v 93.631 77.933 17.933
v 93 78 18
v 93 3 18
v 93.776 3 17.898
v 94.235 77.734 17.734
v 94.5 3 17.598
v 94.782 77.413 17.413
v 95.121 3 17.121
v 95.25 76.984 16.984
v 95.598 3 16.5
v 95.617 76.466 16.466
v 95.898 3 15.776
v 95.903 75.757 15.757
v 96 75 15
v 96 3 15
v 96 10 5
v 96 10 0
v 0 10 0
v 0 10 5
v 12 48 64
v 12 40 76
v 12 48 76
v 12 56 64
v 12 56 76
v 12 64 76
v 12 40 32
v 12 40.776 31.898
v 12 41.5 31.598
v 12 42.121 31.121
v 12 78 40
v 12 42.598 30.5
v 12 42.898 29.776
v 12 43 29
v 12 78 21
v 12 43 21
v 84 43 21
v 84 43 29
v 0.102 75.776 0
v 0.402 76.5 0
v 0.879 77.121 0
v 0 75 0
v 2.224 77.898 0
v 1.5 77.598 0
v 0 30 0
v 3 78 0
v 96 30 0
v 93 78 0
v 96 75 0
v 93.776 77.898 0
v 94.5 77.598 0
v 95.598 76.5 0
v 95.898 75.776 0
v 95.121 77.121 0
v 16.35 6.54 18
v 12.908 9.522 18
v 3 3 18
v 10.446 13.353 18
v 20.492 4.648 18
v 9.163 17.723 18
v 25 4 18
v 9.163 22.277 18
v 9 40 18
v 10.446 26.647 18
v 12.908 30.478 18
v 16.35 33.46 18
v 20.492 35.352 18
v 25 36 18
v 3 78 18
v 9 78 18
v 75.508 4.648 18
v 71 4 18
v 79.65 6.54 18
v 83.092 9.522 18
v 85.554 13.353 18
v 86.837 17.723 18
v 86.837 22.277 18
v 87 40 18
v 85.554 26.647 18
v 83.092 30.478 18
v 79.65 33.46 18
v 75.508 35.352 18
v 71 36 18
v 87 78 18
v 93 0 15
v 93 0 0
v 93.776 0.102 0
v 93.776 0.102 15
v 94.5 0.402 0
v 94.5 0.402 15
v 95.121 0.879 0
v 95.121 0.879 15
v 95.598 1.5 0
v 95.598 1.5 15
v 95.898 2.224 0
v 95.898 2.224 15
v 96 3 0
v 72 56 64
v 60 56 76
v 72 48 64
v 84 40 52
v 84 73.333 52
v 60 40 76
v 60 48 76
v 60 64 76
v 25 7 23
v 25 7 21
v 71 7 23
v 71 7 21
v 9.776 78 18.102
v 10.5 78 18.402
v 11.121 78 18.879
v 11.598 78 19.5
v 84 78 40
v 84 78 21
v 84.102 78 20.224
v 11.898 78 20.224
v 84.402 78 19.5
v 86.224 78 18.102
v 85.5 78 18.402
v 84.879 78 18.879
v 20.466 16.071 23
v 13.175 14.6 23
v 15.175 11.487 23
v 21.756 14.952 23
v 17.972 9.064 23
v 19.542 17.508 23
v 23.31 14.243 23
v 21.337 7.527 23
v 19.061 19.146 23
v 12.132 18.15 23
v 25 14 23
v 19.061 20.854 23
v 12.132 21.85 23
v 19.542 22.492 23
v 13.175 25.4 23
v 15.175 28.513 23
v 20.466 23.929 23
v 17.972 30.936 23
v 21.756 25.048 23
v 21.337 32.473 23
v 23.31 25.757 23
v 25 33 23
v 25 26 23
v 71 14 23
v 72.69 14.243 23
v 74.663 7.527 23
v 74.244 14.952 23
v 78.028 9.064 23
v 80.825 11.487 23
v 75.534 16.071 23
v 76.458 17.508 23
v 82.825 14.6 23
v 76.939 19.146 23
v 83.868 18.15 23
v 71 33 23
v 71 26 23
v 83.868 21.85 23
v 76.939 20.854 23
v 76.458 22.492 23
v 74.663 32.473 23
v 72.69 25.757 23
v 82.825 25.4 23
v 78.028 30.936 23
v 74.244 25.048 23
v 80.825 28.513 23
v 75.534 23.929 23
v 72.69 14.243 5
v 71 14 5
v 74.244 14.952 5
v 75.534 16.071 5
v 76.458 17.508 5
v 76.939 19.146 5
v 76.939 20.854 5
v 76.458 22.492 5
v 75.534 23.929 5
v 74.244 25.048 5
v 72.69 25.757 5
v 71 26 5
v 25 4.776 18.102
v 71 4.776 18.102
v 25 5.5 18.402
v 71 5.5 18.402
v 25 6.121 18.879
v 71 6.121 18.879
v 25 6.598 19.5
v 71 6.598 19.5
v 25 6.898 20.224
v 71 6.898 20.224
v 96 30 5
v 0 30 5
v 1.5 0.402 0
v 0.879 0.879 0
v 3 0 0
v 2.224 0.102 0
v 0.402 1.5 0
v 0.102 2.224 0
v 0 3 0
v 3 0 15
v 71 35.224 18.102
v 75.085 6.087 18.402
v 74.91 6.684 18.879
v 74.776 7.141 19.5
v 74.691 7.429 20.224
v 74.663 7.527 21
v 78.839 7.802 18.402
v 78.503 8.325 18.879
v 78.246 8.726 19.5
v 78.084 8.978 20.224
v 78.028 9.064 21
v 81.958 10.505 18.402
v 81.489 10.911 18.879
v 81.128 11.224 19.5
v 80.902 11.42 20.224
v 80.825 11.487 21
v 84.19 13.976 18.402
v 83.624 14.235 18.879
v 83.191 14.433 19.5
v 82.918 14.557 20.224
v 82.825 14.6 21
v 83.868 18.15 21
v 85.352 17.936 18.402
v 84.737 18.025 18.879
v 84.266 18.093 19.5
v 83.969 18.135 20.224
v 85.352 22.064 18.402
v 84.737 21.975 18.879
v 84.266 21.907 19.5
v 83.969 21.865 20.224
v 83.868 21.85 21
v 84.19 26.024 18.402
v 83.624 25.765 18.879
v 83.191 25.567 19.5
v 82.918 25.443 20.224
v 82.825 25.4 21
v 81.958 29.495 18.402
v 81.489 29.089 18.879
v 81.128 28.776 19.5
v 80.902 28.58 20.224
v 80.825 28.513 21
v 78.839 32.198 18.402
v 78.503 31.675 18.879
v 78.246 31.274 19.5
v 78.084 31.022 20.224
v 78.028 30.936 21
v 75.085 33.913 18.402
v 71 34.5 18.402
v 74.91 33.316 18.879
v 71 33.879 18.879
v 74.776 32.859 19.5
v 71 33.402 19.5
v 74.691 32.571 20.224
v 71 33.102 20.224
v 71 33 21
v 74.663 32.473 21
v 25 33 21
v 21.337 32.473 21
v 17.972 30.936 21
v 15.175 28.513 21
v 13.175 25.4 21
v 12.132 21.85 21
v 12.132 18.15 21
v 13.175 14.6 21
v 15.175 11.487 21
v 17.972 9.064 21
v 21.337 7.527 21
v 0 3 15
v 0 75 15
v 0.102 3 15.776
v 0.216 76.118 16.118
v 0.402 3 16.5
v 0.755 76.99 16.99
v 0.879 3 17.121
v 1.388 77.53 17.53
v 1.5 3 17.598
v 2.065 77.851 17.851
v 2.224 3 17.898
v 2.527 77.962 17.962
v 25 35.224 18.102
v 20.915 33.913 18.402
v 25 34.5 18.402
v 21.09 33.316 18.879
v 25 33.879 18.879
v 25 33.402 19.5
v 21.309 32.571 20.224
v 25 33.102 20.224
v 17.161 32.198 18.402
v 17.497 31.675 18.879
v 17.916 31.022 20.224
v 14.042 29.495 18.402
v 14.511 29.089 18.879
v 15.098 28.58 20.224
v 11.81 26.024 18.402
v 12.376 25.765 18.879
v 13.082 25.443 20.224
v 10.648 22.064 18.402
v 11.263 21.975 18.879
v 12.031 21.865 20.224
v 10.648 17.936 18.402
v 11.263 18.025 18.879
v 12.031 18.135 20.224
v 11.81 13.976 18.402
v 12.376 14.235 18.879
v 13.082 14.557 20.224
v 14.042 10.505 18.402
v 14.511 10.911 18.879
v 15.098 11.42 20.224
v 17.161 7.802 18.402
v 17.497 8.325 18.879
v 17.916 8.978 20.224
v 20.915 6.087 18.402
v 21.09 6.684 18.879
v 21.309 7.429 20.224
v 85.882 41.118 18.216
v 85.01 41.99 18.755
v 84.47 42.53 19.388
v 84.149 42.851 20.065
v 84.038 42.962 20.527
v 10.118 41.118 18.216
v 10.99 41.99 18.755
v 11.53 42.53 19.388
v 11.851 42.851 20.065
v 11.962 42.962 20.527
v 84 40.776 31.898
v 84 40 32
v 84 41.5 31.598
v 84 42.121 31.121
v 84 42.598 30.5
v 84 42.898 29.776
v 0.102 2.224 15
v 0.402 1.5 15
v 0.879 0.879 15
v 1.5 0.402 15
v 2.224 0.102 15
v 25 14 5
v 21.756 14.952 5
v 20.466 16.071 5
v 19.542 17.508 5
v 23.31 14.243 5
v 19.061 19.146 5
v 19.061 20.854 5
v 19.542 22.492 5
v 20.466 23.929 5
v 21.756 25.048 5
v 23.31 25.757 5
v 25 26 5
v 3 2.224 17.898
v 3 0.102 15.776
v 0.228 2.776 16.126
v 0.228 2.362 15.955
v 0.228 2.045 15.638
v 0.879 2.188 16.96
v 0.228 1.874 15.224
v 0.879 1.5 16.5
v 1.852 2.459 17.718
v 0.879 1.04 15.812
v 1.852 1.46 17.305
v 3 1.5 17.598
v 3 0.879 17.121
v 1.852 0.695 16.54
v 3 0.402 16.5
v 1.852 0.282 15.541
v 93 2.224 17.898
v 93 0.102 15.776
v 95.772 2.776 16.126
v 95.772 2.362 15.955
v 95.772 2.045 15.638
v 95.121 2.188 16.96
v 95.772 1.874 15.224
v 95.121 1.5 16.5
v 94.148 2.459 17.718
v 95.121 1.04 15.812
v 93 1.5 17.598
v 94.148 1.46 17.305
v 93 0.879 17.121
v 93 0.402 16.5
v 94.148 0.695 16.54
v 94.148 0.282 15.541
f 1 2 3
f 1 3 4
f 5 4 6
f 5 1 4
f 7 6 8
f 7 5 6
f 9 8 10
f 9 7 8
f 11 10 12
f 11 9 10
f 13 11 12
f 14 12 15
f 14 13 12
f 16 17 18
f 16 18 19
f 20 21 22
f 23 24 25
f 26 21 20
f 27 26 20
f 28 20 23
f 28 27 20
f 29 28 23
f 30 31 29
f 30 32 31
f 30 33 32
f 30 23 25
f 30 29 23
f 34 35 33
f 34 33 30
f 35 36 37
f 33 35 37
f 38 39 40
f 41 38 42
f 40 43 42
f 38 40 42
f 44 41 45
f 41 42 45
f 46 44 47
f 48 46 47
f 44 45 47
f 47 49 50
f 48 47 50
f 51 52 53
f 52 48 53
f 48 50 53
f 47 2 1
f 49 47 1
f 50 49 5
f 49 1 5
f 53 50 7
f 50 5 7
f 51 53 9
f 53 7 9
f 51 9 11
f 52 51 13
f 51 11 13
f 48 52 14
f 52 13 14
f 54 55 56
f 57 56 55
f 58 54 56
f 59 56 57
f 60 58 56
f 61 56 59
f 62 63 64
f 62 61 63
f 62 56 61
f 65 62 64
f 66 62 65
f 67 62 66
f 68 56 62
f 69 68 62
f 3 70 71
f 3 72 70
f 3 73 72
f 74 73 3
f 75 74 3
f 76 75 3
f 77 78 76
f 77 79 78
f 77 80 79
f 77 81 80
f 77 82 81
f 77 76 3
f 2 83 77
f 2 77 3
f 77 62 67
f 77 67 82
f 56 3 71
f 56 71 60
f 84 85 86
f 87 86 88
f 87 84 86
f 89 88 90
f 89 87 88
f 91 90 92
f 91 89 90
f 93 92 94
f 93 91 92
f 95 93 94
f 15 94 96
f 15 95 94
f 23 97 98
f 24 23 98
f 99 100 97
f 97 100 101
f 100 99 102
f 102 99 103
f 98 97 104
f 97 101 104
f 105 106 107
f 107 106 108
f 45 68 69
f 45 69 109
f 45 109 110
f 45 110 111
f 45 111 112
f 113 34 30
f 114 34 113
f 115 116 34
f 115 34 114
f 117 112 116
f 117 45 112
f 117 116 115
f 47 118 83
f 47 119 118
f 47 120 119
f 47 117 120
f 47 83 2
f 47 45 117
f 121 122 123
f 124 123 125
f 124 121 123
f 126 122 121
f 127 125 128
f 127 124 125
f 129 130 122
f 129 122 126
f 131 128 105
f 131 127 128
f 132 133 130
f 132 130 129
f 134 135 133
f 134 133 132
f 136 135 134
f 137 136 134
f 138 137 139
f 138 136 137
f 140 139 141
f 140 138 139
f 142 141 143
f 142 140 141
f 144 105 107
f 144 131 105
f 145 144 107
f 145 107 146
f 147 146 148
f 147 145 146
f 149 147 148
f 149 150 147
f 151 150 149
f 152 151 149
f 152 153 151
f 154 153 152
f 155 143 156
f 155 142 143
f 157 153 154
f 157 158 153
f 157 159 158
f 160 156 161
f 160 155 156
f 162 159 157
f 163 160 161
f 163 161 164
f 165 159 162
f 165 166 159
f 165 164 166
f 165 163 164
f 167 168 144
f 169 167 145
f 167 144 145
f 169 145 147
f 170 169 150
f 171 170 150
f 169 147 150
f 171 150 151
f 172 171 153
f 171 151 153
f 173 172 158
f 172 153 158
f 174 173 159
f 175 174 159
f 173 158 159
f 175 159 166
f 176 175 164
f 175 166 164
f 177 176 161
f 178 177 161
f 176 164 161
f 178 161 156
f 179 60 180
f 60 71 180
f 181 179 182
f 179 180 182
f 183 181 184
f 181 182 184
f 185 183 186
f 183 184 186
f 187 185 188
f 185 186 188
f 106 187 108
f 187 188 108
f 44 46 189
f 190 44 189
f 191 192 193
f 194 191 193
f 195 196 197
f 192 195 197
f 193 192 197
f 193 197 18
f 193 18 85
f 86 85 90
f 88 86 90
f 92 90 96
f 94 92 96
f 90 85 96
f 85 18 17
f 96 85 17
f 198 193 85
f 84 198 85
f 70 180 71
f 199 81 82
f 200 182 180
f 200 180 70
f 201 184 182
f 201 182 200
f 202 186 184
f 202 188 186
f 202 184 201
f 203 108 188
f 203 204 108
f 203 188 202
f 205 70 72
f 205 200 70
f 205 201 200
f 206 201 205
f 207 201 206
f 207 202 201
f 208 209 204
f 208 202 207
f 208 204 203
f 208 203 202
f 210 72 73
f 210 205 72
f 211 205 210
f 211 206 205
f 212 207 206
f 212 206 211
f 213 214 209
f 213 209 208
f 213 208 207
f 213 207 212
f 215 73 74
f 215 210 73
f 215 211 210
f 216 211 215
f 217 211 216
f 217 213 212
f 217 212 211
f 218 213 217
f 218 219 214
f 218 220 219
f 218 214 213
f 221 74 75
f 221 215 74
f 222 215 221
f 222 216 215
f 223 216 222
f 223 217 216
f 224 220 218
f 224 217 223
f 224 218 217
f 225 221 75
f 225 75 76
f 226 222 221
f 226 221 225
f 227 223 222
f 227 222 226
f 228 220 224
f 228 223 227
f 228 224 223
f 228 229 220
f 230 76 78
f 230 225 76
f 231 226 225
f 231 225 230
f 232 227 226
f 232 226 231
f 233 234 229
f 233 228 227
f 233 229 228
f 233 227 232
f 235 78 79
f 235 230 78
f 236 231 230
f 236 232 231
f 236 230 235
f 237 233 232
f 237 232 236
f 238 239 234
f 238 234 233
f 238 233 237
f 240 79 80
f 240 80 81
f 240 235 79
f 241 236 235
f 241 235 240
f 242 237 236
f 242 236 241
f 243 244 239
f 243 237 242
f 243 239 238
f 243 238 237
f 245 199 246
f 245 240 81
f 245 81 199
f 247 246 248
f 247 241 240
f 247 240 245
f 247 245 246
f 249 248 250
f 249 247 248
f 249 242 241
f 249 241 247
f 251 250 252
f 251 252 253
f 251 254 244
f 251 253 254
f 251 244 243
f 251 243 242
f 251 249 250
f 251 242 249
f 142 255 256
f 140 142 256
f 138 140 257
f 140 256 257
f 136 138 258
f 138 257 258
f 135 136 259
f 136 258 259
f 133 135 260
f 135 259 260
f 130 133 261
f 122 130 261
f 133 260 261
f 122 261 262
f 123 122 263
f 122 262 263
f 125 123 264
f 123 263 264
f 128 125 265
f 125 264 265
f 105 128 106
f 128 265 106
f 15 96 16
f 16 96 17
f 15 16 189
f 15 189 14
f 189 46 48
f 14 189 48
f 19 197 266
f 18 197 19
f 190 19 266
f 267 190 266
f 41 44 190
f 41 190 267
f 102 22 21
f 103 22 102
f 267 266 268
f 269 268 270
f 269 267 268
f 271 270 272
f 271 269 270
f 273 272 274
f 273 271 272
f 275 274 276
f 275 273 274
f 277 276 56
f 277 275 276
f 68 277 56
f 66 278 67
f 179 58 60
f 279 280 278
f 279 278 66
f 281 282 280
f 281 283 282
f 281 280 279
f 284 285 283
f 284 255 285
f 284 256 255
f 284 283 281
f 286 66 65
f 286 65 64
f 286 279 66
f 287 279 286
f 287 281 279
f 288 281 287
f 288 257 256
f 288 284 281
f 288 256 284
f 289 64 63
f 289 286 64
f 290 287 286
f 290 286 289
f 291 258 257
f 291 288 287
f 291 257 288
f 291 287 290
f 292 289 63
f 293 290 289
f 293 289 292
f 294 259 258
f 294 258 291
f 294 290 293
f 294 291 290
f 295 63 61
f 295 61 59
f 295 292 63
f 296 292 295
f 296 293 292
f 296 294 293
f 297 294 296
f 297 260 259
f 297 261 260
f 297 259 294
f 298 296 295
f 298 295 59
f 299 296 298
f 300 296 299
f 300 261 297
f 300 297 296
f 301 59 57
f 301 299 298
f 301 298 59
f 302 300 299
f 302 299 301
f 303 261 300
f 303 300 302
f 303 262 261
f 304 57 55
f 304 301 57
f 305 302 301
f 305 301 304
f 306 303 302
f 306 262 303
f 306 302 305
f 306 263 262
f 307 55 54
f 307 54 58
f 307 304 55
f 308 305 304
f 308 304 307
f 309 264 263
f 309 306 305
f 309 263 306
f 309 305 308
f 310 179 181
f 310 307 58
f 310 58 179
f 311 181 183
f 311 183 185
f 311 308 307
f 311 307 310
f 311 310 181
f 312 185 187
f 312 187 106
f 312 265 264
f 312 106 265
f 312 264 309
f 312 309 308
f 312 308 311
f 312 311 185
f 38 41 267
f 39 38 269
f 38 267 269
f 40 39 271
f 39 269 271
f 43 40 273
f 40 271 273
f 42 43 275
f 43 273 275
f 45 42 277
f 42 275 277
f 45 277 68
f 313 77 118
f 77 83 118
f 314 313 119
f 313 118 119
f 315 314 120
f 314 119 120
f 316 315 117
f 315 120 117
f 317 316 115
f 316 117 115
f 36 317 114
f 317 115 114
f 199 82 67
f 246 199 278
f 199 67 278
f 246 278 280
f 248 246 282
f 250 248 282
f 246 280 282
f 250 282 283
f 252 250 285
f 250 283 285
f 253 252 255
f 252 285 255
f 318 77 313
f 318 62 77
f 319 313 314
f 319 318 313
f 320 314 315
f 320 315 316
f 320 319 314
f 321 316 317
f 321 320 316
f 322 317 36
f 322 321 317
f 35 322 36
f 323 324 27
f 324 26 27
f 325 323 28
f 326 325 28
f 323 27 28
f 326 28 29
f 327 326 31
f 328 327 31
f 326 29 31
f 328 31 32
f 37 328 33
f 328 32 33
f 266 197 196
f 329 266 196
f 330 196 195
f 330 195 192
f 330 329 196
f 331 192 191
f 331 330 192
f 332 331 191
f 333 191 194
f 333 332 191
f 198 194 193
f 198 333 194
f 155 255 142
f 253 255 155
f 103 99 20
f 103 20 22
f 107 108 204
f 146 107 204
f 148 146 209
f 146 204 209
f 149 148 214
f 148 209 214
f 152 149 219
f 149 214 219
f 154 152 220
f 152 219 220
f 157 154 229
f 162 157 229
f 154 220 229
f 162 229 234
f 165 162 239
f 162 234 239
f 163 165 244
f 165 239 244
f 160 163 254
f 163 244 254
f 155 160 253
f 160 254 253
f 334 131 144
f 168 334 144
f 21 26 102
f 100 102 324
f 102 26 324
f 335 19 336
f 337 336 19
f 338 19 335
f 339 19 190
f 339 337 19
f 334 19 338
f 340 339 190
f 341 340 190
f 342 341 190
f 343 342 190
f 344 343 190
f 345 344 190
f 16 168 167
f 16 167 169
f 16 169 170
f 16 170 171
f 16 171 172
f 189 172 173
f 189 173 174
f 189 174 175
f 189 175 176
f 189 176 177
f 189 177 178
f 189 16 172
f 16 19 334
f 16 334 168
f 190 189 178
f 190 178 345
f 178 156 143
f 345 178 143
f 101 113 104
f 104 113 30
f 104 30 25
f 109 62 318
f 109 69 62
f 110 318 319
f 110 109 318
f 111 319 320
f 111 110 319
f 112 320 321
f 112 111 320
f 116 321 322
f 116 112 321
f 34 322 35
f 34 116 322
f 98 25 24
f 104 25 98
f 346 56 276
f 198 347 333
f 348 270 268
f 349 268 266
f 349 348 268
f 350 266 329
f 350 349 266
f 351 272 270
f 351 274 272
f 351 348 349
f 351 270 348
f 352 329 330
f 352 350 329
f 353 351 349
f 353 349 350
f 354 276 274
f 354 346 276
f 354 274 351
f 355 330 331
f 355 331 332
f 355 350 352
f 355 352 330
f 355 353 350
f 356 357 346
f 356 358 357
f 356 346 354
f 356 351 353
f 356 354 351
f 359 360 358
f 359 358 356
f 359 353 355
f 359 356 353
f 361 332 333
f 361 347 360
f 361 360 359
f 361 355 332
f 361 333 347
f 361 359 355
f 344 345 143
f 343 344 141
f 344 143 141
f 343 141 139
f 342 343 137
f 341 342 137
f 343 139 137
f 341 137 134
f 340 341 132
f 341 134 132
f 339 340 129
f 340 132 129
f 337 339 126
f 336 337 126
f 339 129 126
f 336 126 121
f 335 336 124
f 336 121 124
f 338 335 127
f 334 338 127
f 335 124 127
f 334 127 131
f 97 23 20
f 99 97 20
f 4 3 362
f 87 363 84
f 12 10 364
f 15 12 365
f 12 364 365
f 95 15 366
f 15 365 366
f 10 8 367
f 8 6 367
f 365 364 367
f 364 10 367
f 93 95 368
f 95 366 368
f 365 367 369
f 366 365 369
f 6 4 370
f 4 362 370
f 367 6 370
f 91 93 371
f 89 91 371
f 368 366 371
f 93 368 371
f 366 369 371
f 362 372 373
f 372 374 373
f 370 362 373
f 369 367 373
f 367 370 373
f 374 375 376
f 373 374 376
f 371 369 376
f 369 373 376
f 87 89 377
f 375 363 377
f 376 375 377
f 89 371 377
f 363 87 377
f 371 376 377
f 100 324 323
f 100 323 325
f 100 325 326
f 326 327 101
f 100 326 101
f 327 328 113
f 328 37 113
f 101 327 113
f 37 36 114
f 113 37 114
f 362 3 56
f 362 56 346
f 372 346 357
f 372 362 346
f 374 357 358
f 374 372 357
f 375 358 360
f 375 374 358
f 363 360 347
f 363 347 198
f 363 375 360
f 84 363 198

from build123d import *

# Parameters (mm, degrees)
F0_W      = 96
F0_H      = 78
F1_DEPTH  = 18
F2_W      = 72
F2_H      = 38
F4_DEPTH  = 58
F6_DEPTH  = 38
F7_W      = 8
F7_H      = 12
F8_DEPTH  = 60.001
F10_DEPTH = 72.001
F11_W     = 20
F11_H     = 5
F12_DEPTH = 96.001
F13_W     = 46
F13_H     = 26
F14_DEPTH = 5
F17_DEPTH = 23.001
F18_W     = 3
F18_H     = 14
F19_DEPTH = 72
F20_R     = 2.99999


# Not quite as in the source:
# - a fillet or chamfer is up to 0.001 mm smaller than in the source, because OpenCascade refuses the exact size


with BuildPart() as f1:
    # F0 (on Top) → F1 (new body)
    with BuildSketch(Plane.XY):
        with Locations((48, 39)):
            Rectangle(F0_W, F0_H)
    extrude(amount=F1_DEPTH)

    # F2 (on face) → F4 (join, through all)
    with BuildSketch(Plane.XY.offset(18)):
        with Locations((48, 59)):
            Rectangle(F2_W, F2_H)
    extrude(amount=F4_DEPTH)

    # F5 (on face) → F6 (cut, through all)
    with BuildSketch(Plane(origin=(0, 78, 0), x_dir=(-1, 0, 0), z_dir=(0, 1, 0))):
        Polygon((-60, 76), (-84, 76), (-84, 52), align=None)
    extrude(amount=-F6_DEPTH, mode=Mode.SUBTRACT)

    # F7 (on face) → F8 (cut, through all)
    with BuildSketch(Plane(origin=(12, 0, 0), x_dir=(0, -1, 0), z_dir=(-1, 0, 0))):
        with Locations((-52, 70)):
            Rectangle(F7_W, F7_H)
    extrude(amount=-F8_DEPTH, mode=Mode.SUBTRACT)

    # F9 (on face) → F10 (cut, through all)
    with BuildSketch(Plane(origin=(12, 0, 0), x_dir=(0, -1, 0), z_dir=(-1, 0, 0))):
        Polygon((-78, 40), (-64, 76), (-78, 76), align=None)
    extrude(amount=-F10_DEPTH, mode=Mode.SUBTRACT)

    # F11 (on face) → F12 (cut, through all)
    with BuildSketch(Plane.YZ.offset(96)):
        with Locations((20, 2.5)):
            Rectangle(F11_W, F11_H)
    extrude(amount=-F12_DEPTH, mode=Mode.SUBTRACT)

    # F13 (on face) → F14 (join)
    with BuildSketch(Plane.XY.offset(18)):
        with BuildLine():
            Line((25, 7), (25, 33))
            ThreePointArc((25, 33), (12, 20), (25, 7))
        make_face()
        with BuildLine():
            ThreePointArc((71, 7), (84, 20), (71, 33))
            Line((71, 33), (71, 7))
        make_face()
        with Locations((48, 20)):
            Rectangle(F13_W, F13_H)
    extrude(amount=F14_DEPTH)

    # F15 (on face) → F17 (cut, through all)
    with BuildSketch(Plane.XY.offset(23)):
        with BuildLine():
            ThreePointArc((25, 26), (19, 20), (25, 14))
            Line((25, 14), (71, 14))
            ThreePointArc((71, 14), (77, 20), (71, 26))
            Line((71, 26), (25, 26))
        make_face()
    extrude(amount=-F17_DEPTH, mode=Mode.SUBTRACT)

    # F18 (on face) → F19 (cut, through all)
    with BuildSketch(Plane.YZ.offset(84)):
        with Locations((41.5, 25)):
            Rectangle(F18_W, F18_H)
    extrude(amount=-F19_DEPTH, mode=Mode.SUBTRACT)

    # F20 (radius 3 in the source; OpenCascade refuses exactly that, so slightly less here)
    f20_edges = [f1.edges().sort_by_distance(p)[0] for p in [
        (48, 7, 18),
        (48, 43, 18),
        (48, 43, 32),
        (48, 0, 18),
        (0, 39, 18),
        (84, 60.5, 18),
        (12, 60.5, 18),
        (96, 39, 18),
        (96, 0, 9),
        (0, 0, 9),
        (96, 78, 9),
        (0, 78, 9),
    ]]
    fillet(f20_edges, radius=F20_R)


solid = f1.part
